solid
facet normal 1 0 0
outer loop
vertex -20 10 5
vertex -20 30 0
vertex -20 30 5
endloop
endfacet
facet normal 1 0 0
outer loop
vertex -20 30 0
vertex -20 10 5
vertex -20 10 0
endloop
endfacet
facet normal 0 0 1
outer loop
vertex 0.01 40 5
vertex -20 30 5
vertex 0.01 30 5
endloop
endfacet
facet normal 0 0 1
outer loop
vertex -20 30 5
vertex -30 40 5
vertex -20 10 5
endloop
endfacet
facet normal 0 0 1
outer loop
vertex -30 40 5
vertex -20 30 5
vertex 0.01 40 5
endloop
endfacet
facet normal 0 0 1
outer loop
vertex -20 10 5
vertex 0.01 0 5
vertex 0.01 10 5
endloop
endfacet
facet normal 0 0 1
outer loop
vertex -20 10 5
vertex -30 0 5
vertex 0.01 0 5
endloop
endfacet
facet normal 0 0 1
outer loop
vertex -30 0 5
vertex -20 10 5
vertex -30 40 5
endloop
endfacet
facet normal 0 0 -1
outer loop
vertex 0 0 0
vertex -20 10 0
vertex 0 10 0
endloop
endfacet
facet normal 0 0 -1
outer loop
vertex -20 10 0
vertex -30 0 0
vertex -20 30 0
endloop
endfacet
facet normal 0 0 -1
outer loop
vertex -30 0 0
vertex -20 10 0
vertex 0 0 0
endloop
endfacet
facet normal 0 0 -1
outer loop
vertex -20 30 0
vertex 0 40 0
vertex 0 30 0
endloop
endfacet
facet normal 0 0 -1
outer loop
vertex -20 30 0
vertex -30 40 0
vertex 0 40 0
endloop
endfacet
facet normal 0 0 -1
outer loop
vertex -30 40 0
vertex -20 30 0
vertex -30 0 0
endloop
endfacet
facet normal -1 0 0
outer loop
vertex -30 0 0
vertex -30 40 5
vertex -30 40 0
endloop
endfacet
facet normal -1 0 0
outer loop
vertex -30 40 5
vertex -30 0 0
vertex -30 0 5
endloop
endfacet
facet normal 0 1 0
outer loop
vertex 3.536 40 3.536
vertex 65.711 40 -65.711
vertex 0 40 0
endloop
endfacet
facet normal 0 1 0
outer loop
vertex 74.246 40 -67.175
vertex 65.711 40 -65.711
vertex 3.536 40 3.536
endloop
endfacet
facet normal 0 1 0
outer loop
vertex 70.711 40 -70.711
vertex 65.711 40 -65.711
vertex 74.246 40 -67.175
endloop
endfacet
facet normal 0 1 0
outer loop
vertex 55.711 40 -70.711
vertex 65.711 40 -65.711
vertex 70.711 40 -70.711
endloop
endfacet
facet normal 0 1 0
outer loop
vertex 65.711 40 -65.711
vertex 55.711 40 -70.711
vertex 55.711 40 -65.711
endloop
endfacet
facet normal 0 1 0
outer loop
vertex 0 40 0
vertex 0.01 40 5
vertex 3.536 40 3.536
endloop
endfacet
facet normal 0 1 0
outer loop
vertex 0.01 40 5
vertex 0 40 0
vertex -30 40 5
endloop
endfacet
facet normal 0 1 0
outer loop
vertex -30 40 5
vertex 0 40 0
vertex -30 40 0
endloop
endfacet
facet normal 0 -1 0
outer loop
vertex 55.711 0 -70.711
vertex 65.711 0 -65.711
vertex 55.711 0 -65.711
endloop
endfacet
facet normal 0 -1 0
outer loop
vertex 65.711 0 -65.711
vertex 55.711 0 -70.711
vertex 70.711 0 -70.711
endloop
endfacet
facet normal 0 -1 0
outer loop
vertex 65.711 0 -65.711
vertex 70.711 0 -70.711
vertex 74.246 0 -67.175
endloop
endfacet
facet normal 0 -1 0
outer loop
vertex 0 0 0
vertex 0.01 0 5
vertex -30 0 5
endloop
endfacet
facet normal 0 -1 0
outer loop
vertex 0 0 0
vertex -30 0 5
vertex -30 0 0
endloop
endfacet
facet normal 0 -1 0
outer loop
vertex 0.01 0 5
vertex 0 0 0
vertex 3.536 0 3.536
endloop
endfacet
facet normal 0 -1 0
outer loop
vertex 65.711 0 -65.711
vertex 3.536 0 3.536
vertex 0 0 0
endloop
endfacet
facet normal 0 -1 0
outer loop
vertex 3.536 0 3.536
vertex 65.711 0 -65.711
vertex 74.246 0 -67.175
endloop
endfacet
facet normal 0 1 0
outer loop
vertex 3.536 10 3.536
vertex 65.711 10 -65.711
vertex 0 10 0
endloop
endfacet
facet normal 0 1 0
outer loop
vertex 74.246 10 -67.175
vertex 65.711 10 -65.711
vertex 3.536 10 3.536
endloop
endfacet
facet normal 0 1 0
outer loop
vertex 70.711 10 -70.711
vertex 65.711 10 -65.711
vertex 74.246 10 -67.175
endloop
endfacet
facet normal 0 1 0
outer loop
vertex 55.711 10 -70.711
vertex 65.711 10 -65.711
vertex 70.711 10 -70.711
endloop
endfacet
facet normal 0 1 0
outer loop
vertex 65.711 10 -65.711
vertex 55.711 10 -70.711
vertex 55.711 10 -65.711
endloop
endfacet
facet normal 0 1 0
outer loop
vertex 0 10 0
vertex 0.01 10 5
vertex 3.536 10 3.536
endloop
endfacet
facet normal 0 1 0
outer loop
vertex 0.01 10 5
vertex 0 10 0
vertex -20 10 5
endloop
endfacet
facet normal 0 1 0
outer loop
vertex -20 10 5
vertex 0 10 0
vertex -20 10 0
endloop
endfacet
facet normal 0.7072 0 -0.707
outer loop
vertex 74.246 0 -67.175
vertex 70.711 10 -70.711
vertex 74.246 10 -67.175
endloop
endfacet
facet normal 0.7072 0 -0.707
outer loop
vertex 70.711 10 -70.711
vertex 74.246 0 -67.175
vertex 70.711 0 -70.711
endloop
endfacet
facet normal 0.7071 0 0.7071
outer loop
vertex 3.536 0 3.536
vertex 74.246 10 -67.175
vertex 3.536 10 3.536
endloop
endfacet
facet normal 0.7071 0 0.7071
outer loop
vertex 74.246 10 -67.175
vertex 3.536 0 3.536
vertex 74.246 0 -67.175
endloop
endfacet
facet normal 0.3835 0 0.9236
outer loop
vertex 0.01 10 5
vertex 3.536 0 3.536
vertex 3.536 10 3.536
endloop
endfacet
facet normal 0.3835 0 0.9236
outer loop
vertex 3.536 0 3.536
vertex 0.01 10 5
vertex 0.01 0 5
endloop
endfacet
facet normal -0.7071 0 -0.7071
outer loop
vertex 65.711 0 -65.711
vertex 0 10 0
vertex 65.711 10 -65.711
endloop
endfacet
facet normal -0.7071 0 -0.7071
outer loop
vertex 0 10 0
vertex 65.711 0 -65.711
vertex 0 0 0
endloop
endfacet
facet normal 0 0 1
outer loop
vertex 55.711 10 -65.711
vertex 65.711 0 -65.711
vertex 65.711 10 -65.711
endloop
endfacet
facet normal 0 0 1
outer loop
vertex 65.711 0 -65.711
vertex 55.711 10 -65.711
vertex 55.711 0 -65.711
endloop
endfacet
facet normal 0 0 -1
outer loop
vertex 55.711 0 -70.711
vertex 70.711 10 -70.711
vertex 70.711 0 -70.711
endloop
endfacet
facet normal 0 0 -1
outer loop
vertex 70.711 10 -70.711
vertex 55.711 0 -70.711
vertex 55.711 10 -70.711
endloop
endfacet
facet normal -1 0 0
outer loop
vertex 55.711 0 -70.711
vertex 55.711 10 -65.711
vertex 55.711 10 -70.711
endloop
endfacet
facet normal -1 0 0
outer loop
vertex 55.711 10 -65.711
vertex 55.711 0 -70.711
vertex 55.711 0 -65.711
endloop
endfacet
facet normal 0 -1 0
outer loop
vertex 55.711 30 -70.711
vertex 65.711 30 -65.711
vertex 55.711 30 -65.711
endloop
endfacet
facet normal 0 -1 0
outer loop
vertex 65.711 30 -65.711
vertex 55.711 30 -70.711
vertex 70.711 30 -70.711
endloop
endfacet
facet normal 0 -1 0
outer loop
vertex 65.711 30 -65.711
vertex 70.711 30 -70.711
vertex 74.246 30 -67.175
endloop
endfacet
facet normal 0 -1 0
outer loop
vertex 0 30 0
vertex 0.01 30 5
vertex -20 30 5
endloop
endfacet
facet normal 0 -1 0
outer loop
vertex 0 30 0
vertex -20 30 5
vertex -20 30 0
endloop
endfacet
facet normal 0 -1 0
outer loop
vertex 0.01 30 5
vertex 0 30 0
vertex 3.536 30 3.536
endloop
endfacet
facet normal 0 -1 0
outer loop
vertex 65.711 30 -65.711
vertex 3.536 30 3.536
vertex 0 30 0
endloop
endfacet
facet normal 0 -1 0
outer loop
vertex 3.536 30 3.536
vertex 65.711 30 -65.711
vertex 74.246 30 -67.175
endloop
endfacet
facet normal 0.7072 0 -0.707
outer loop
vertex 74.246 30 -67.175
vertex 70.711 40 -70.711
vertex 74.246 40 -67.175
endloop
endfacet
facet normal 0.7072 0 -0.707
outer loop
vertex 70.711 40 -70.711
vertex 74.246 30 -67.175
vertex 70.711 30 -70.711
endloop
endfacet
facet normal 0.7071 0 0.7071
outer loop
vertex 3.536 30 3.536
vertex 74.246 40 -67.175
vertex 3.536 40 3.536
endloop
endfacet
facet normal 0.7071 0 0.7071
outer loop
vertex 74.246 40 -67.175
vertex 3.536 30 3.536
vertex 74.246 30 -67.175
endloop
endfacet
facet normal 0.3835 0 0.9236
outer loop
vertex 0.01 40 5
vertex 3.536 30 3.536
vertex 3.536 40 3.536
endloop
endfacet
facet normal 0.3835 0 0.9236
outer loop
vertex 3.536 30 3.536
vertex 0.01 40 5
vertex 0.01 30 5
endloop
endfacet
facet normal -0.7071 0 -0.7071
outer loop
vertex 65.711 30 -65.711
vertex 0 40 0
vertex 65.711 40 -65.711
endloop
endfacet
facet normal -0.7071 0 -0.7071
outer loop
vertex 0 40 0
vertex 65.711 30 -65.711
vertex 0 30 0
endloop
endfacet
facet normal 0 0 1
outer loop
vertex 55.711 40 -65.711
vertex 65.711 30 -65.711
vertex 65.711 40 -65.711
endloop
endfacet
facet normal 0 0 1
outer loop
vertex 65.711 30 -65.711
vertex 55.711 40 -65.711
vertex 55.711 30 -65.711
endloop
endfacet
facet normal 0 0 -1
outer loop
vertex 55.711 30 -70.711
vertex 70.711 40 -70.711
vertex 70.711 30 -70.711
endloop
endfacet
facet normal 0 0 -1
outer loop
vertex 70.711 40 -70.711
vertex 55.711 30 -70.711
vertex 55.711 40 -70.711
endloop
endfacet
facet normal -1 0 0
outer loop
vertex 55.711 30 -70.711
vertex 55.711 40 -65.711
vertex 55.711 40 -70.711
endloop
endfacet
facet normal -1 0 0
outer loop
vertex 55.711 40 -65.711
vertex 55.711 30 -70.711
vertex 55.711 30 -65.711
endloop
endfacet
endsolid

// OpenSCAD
module bike_mount() {
  x = 100;
  y = 10;
  arm_angle = 45;
  thickness = 5;
  screw_distance=30;
  screw_plate_x = 10;
  screw_plate_x_arm = 20;
  screw_plate_x_offset = screw_plate_x_arm + screw_plate_x;
  // screw plates
  difference() {
    translate([-screw_plate_x_offset, 0, 0])
      cube([screw_plate_x, screw_distance + screw_plate_x, thickness]);
    translate([-screw_plate_x_offset/2, screw_distance+screw_plate_x/2, 0])
      cylinder(m=3, h=thickness);
    translate([-screw_plate_x_offset/2, screw_plate_x/2, 0])
      cylinder(m=3, h=thickness);
  }
  // arms
    arm_holder(screw_plate_x_arm, x, y, thickness, arm_angle);
  translate([0, screw_distance, 0])arm_holder(screw_plate_x_arm, x, y, thickness, arm_angle);
}

module arm_holder(x_screw_arm, x_angled, y, thickness, angle) {
  hull() {
    rotate([0, angle, 0])
      cube([x_angled, y, thickness]);
    cube([.01, y, thickness]);
  }
  translate([-x_screw_arm, 0, 0])cube([x_screw_arm, y, thickness]);
  // holder
  rotate([0, angle, 0])translate([x_angled, 0, 0])rotate([0, -angle, 0])
    difference() {
      translate([-15, 0, 0])cube([15, y, thickness]);
    }
}

bike_mount();
